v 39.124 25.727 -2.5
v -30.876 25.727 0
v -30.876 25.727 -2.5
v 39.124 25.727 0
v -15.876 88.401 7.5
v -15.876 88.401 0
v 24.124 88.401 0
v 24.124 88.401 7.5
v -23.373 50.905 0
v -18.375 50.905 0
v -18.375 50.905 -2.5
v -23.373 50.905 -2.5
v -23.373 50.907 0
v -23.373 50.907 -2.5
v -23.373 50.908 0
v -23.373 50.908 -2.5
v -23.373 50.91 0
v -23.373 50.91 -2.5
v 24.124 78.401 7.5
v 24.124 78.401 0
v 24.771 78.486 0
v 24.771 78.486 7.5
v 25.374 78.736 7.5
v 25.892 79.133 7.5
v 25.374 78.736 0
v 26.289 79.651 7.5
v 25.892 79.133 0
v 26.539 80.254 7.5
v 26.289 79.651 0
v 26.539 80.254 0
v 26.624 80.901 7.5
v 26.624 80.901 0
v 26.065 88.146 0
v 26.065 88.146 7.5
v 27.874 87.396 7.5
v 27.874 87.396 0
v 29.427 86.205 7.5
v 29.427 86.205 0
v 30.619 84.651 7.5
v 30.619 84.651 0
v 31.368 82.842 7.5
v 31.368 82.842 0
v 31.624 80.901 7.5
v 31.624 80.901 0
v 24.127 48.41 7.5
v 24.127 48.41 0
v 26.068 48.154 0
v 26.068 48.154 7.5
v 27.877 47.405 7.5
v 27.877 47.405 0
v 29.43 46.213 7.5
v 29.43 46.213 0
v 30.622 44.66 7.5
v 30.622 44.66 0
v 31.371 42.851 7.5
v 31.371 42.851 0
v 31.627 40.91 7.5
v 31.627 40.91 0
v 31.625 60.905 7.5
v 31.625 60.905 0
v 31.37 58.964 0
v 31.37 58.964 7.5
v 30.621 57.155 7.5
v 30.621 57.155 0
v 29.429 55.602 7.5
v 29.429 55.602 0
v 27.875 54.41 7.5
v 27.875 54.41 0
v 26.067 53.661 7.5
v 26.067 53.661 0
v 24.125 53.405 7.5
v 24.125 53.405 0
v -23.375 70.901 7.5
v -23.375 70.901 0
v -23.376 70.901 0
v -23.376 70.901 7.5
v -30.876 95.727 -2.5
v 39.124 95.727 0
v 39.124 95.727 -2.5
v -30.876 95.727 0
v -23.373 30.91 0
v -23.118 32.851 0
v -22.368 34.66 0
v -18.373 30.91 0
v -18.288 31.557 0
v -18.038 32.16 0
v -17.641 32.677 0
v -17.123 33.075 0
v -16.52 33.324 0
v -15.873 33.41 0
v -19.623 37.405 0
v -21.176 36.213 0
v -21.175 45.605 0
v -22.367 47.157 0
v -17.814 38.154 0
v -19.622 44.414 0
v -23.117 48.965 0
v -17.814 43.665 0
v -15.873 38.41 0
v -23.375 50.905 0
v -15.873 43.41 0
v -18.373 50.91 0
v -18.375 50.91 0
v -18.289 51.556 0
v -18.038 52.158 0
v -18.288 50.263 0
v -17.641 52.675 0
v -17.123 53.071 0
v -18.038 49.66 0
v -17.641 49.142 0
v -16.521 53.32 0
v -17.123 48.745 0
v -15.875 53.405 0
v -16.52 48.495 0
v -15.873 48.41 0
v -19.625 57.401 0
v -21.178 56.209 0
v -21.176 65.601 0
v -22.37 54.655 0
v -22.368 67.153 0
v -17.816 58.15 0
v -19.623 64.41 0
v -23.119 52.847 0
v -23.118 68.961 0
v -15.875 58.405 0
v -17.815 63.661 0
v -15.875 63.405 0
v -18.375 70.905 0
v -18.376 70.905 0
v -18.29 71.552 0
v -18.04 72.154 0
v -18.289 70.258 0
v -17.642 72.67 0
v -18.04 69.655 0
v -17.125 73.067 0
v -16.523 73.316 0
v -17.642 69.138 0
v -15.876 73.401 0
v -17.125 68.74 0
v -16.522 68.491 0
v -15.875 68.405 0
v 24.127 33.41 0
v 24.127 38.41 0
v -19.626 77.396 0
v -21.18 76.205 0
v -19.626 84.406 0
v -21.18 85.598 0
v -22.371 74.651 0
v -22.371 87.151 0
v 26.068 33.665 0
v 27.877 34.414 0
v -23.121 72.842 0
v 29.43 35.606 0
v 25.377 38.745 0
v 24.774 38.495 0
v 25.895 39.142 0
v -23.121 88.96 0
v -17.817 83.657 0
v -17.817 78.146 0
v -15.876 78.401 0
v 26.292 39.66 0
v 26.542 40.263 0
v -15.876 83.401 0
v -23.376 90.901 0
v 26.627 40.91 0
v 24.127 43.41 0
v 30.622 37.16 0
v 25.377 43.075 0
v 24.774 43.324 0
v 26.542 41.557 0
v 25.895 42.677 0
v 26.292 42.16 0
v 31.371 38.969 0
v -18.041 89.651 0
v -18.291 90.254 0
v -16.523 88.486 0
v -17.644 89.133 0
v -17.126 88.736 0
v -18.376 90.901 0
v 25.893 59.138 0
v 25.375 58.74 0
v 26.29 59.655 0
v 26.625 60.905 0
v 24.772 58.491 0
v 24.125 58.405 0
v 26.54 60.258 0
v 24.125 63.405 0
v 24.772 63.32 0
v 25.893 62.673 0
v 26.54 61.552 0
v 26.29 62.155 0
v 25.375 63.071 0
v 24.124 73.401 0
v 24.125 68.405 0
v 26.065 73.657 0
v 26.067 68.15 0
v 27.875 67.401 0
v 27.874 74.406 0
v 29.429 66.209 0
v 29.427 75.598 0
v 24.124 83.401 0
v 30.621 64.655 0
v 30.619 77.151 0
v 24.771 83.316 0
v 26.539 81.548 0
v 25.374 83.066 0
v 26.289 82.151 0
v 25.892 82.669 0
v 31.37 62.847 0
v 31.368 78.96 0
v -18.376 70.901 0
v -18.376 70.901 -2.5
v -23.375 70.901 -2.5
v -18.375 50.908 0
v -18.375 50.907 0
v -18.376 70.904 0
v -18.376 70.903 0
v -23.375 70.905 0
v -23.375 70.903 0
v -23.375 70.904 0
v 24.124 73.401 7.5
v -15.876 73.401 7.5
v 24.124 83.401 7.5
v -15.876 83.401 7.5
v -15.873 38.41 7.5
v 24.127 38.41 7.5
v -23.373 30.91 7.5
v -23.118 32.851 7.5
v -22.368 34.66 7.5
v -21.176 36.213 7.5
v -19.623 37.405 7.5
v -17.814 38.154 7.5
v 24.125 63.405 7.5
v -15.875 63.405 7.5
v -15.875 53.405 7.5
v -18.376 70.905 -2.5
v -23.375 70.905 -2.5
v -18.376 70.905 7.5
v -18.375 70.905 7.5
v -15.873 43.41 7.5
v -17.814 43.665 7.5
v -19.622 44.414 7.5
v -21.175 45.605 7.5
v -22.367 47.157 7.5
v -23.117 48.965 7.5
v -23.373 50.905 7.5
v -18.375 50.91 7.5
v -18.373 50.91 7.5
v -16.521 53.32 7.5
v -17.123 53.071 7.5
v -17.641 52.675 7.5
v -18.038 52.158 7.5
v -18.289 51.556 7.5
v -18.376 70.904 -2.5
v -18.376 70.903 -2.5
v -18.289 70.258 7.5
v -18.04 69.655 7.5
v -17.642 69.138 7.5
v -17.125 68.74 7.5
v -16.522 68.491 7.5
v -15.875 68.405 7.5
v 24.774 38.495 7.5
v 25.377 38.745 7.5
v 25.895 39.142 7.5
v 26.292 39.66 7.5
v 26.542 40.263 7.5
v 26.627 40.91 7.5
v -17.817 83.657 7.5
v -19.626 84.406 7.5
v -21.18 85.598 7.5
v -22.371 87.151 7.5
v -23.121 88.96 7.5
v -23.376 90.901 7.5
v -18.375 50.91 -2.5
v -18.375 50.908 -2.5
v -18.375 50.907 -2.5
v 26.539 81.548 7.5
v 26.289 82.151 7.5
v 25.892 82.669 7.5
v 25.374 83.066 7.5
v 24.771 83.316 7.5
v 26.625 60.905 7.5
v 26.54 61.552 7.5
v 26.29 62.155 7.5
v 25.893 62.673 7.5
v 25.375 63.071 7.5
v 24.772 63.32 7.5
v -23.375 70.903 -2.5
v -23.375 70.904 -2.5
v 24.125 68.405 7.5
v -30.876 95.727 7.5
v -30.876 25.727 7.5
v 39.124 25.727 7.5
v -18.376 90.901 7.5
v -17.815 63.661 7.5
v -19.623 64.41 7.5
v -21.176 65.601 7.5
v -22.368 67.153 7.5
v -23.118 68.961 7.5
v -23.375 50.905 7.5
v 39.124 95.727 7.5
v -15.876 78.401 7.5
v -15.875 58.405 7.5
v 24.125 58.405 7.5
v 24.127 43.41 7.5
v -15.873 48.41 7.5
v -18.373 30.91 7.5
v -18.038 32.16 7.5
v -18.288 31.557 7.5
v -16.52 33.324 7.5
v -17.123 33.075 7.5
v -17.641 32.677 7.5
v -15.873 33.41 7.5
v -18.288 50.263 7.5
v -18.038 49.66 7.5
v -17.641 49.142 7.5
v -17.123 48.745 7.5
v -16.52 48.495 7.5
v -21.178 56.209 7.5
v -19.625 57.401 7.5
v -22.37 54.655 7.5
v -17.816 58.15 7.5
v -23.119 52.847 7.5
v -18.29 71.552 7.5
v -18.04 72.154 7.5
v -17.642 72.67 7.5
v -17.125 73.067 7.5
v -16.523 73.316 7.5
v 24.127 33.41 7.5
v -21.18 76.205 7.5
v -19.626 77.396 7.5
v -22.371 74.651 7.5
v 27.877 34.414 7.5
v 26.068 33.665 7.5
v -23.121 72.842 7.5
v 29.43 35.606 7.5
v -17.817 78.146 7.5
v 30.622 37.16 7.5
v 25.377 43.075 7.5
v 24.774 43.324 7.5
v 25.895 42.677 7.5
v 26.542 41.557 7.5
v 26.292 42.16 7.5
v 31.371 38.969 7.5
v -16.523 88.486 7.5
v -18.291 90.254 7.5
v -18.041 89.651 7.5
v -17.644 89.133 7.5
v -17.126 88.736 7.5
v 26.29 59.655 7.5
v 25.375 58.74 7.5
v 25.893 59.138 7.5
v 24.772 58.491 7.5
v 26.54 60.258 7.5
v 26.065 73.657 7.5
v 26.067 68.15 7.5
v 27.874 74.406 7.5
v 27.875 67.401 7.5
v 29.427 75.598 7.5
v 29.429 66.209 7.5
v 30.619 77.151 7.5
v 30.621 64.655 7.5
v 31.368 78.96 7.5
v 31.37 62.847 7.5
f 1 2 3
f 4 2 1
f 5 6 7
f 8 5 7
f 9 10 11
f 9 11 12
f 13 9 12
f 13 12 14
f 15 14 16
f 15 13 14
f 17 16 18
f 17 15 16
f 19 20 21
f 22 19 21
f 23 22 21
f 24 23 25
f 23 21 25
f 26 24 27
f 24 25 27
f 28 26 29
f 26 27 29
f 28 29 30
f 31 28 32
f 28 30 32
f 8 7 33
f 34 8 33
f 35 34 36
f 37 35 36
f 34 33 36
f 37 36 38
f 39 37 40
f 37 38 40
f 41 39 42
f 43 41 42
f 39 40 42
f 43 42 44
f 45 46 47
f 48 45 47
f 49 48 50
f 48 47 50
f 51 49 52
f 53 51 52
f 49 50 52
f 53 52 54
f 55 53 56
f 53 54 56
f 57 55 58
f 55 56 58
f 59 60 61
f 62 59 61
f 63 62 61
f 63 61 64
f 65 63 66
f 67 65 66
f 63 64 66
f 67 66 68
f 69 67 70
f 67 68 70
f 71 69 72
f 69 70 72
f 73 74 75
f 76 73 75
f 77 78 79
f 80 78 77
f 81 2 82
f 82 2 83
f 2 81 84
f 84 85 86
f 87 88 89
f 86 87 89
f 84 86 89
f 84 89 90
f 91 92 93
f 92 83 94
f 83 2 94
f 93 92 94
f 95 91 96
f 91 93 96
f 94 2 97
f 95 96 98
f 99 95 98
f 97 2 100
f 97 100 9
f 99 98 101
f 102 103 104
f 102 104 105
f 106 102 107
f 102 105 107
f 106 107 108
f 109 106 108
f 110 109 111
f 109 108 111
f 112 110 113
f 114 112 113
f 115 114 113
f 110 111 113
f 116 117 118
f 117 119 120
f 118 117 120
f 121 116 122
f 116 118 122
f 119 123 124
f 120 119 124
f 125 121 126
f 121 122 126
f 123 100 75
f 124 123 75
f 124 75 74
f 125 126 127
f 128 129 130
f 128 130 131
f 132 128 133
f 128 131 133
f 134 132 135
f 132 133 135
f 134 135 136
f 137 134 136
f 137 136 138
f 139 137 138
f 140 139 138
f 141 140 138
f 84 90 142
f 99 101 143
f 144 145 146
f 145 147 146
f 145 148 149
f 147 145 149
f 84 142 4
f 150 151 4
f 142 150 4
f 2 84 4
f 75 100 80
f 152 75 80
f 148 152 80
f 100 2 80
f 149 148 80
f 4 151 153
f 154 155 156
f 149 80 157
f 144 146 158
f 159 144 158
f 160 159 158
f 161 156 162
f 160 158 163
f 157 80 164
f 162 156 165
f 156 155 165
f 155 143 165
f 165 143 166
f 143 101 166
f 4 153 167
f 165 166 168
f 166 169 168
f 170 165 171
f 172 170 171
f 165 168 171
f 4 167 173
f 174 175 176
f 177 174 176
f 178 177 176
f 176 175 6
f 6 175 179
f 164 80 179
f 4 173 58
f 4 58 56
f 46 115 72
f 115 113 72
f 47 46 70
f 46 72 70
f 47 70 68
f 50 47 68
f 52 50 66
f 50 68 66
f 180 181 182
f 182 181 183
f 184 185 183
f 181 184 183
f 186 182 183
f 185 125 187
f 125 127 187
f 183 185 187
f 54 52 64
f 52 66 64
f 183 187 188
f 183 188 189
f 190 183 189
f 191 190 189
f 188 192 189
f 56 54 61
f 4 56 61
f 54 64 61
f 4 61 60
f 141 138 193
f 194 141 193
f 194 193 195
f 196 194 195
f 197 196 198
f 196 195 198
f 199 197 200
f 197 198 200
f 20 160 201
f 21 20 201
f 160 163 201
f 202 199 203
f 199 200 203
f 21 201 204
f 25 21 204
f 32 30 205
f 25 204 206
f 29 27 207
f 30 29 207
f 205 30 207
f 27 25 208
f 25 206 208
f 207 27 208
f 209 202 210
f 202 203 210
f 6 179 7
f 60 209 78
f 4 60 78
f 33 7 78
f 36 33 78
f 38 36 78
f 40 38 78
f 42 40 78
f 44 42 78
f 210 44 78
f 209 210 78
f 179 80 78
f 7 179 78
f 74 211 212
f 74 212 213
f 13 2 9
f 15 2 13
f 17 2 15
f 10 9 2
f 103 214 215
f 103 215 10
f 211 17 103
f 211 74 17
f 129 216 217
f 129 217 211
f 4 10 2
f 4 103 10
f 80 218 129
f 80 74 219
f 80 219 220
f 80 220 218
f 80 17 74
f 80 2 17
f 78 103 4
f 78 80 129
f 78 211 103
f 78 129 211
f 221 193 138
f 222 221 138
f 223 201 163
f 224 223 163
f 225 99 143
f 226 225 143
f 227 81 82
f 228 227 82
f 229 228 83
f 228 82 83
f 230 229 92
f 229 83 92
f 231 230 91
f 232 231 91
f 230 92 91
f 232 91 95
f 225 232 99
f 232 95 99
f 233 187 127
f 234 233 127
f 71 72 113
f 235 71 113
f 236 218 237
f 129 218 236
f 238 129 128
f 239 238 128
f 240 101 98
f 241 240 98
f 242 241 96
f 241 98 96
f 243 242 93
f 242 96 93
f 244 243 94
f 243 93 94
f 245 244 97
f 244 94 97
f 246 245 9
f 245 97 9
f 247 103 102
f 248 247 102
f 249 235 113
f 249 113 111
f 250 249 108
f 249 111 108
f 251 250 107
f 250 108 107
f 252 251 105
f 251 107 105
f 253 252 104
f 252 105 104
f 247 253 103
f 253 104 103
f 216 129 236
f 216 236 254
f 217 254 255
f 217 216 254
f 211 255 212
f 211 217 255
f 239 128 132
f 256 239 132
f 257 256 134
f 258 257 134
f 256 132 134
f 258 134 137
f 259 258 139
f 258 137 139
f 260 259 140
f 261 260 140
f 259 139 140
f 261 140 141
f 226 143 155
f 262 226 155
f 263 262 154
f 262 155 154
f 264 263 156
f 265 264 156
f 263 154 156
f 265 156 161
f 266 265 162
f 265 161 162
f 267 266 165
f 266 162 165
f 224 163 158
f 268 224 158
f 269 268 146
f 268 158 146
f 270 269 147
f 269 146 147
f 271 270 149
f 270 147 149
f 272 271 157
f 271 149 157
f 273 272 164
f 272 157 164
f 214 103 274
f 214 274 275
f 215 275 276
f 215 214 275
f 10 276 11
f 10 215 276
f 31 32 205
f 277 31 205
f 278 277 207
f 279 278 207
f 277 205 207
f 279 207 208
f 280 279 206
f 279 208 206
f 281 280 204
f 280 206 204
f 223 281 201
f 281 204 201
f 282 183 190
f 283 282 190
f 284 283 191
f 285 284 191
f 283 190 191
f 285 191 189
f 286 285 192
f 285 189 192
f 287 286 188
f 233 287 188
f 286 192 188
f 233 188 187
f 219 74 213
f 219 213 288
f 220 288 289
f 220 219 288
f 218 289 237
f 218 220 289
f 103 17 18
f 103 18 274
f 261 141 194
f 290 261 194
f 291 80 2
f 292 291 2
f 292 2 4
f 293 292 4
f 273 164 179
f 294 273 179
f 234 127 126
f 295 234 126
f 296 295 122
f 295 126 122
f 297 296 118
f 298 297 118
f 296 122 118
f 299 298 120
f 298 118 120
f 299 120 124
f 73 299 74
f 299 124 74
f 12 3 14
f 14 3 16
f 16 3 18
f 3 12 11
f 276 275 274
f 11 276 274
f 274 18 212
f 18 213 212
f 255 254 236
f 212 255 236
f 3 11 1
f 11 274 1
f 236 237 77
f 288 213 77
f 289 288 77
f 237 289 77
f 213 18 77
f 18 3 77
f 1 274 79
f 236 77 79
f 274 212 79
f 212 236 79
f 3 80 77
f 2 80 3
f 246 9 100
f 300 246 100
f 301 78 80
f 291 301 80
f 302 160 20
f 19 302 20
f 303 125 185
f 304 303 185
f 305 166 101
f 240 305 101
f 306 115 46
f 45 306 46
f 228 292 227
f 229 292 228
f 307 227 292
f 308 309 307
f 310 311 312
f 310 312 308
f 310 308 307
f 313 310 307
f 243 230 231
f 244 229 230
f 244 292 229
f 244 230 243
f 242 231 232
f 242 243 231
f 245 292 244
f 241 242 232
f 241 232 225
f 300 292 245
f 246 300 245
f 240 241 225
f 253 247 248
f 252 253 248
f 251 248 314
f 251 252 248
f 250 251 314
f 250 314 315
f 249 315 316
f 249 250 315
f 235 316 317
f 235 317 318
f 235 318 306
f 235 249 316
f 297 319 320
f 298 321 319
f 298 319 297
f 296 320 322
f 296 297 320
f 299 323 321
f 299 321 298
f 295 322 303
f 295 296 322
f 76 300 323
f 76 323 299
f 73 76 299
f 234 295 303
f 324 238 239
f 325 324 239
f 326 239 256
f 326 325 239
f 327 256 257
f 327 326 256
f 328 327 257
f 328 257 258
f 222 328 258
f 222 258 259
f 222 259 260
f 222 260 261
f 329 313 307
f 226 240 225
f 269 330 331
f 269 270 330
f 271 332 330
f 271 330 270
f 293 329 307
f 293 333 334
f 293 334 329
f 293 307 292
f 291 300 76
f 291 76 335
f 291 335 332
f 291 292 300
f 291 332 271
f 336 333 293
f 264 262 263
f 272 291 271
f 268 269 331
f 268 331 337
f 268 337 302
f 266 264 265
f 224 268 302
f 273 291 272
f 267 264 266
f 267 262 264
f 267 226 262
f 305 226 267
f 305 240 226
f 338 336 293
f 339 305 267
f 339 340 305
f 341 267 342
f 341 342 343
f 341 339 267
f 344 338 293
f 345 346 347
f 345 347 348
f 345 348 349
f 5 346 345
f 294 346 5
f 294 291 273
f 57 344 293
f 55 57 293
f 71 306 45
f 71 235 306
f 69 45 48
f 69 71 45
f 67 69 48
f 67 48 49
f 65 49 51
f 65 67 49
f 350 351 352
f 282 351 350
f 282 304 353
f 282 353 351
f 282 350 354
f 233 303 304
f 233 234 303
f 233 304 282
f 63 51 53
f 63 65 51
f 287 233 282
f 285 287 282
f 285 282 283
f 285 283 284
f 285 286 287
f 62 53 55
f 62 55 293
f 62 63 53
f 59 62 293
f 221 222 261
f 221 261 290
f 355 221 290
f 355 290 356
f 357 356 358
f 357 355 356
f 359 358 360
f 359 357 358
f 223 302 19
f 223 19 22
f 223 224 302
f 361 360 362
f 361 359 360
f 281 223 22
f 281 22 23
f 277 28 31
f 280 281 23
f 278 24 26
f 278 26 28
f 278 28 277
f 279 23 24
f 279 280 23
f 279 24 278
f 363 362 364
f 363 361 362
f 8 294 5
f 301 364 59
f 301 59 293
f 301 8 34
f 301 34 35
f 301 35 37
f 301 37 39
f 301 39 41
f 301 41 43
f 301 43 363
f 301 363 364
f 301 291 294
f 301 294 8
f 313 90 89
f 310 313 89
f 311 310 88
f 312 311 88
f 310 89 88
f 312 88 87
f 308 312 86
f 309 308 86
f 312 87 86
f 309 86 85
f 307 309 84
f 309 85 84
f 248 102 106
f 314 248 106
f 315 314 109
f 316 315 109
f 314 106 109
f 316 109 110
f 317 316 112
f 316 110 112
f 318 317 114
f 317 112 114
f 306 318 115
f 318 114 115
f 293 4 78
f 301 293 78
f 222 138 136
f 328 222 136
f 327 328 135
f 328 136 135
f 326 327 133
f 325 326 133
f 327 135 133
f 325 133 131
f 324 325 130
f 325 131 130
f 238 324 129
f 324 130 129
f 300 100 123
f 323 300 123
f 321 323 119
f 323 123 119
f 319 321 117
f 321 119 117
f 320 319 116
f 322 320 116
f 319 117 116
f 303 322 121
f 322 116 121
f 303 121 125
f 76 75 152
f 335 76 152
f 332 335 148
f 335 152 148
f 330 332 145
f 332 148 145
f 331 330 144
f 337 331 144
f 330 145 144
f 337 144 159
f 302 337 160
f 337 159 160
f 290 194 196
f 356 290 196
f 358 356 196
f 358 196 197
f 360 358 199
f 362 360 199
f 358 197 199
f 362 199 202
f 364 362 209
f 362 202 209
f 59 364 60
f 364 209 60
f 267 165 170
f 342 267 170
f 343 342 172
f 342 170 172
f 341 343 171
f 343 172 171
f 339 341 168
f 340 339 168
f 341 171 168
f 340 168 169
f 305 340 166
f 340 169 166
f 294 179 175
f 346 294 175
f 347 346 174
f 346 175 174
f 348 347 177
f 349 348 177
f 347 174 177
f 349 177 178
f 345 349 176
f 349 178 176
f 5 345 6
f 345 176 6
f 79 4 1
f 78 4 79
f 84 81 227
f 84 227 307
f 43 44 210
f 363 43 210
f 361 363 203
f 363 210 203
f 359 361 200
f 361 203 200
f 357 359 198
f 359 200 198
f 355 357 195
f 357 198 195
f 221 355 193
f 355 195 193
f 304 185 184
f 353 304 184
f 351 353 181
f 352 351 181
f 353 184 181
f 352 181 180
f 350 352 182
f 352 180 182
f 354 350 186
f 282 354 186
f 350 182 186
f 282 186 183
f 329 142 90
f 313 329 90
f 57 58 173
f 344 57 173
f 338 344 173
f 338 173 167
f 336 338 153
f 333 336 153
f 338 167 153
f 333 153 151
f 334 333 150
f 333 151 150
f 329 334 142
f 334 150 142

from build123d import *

# Parameters (mm, degrees)
F0_W     = 5
F0_H     = 4.826
F0_H_2   = 5.182414
F1_DEPTH = 7.5
F2_DEPTH = 2.5


with BuildPart() as f1:
    # F0 (on Top) → F1 (new body)
    with BuildSketch(Plane.XY):
        with BuildLine():
            ThreePointArc((-15.873059, 43.409657), (-21.174872, 45.604869), (-23.373057, 50.90545))
            Line((-23.373057, 50.90545), (-23.37463, 50.90545))
            ThreePointArc((-23.37463, 50.90545), (-21.177931, 56.208751), (-15.87463, 58.40545))
            Line((-15.87463, 58.40545), (24.12537, 58.40545))
            ThreePointArc((24.12537, 58.40545), (25.893137, 59.137683), (26.62537, 60.90545))
            ThreePointArc((26.62537, 60.90545), (25.893137, 62.673217), (24.12537, 63.40545))
            Line((24.12537, 63.40545), (-15.87463, 63.40545))
            ThreePointArc((-15.87463, 63.40545), (-21.176443, 65.600662), (-23.374629, 70.901243))
            Line((-23.374629, 70.901243), (-23.376201, 70.901243))
            ThreePointArc((-23.376201, 70.901243), (-21.179502, 76.204544), (-15.876201, 78.401243))
            Line((-15.876201, 78.401243), (24.123799, 78.401243))
            ThreePointArc((24.123799, 78.401243), (25.891565, 79.133476), (26.623799, 80.901243))
            ThreePointArc((26.623799, 80.901243), (25.891565, 82.66901), (24.123799, 83.401243))
            Line((24.123799, 83.401243), (-15.876201, 83.401243))
            ThreePointArc((-15.876201, 83.401243), (-21.179502, 85.597942), (-23.376201, 90.901243))
            Line((-23.376201, 90.901243), (-23.376201, 95.727243))
            Line((-23.376201, 95.727243), (-30.876201, 95.727243))
            Line((-30.876201, 95.727243), (-30.876201, 25.727243))
            Line((-30.876201, 25.727243), (-23.373059, 25.727243))
            Line((-23.373059, 25.727243), (-23.373059, 30.909657))
            ThreePointArc((-23.373059, 30.909657), (-21.176359, 36.212958), (-15.873059, 38.409657))
            Line((-15.873059, 38.409657), (24.126941, 38.409657))
            ThreePointArc((24.126941, 38.409657), (25.894708, 39.14189), (26.626941, 40.909657))
            ThreePointArc((26.626941, 40.909657), (25.894708, 42.677424), (24.126941, 43.409657))
            Line((24.126941, 43.409657), (-15.873059, 43.409657))
        make_face()
        with BuildLine():
            ThreePointArc((-15.87463, 53.40545), (-17.640909, 52.674704), (-18.374626, 50.909657))
            Line((-18.374626, 50.909657), (-18.373059, 50.909657))
            ThreePointArc((-18.373059, 50.909657), (-17.640825, 49.14189), (-15.873059, 48.409657))
            Line((-15.873059, 48.409657), (24.126941, 48.409657))
            ThreePointArc((24.126941, 48.409657), (29.430242, 46.212958), (31.626941, 40.909657))
            ThreePointArc((31.626941, 40.909657), (29.430242, 35.606356), (24.126941, 33.409657))
            Line((24.126941, 33.409657), (-15.873059, 33.409657))
            ThreePointArc((-15.873059, 33.409657), (-17.640825, 32.677424), (-18.373059, 30.909657))
            Line((-18.373059, 30.909657), (-18.373059, 25.727243))
            Line((-18.373059, 25.727243), (39.123799, 25.727243))
            Line((39.123799, 25.727243), (39.123799, 95.727243))
            Line((39.123799, 95.727243), (-18.376201, 95.727243))
            Line((-18.376201, 95.727243), (-18.376201, 90.901243))
            ThreePointArc((-18.376201, 90.901243), (-17.643968, 89.133476), (-15.876201, 88.401243))
            Line((-15.876201, 88.401243), (24.123799, 88.401243))
            ThreePointArc((24.123799, 88.401243), (29.427099, 86.204544), (31.623799, 80.901243))
            ThreePointArc((31.623799, 80.901243), (29.427099, 75.597942), (24.123799, 73.401243))
            Line((24.123799, 73.401243), (-15.876201, 73.401243))
            ThreePointArc((-15.876201, 73.401243), (-17.64248, 72.670497), (-18.376198, 70.90545))
            Line((-18.376198, 70.90545), (-18.37463, 70.90545))
            ThreePointArc((-18.37463, 70.90545), (-17.642397, 69.137683), (-15.87463, 68.40545))
            Line((-15.87463, 68.40545), (24.12537, 68.40545))
            ThreePointArc((24.12537, 68.40545), (29.428671, 66.208751), (31.62537, 60.90545))
            ThreePointArc((31.62537, 60.90545), (29.428671, 55.602149), (24.12537, 53.40545))
            Line((24.12537, 53.40545), (-15.87463, 53.40545))
        make_face()
        with Locations((-20.876201, 93.314243)):
            Rectangle(F0_W, F0_H)
        with Locations((-20.873059, 28.31845)):
            Rectangle(F0_W, F0_H_2)
    extrude(amount=F1_DEPTH)


with BuildPart() as f2:
    # F0 (on Top) → F2 (new body)
    with BuildSketch(Plane.XY):
        with BuildLine():
            ThreePointArc((-23.373057, 50.90545), (-23.373058, 50.907553), (-23.373059, 50.909657))
            Line((-23.373059, 50.909657), (-18.374626, 50.909657))
            ThreePointArc((-18.374626, 50.909657), (-17.640909, 52.674704), (-15.87463, 53.40545))
            Line((-15.87463, 53.40545), (24.12537, 53.40545))
            ThreePointArc((24.12537, 53.40545), (29.428671, 55.602149), (31.62537, 60.90545))
            ThreePointArc((31.62537, 60.90545), (29.428671, 66.208751), (24.12537, 68.40545))
            Line((24.12537, 68.40545), (-15.87463, 68.40545))
            ThreePointArc((-15.87463, 68.40545), (-17.642397, 69.137683), (-18.37463, 70.90545))
            Line((-18.37463, 70.90545), (-18.376198, 70.90545))
            ThreePointArc((-18.376198, 70.90545), (-18.376201, 70.903347), (-18.376201, 70.901243))
            Line((-18.376201, 70.901243), (-23.374629, 70.901243))
            ThreePointArc((-23.374629, 70.901243), (-21.176443, 65.600662), (-15.87463, 63.40545))
            Line((-15.87463, 63.40545), (24.12537, 63.40545))
            ThreePointArc((24.12537, 63.40545), (25.893137, 62.673217), (26.62537, 60.90545))
            ThreePointArc((26.62537, 60.90545), (25.893137, 59.137683), (24.12537, 58.40545))
            Line((24.12537, 58.40545), (-15.87463, 58.40545))
            ThreePointArc((-15.87463, 58.40545), (-21.177931, 56.208751), (-23.37463, 50.90545))
            Line((-23.37463, 50.90545), (-23.373057, 50.90545))
        make_face()
        with BuildLine():
            Line((-18.373059, 50.909657), (-18.374626, 50.909657))
            ThreePointArc((-18.374626, 50.909657), (-18.374629, 50.907553), (-18.37463, 50.90545))
            Line((-18.37463, 50.90545), (-23.373057, 50.90545))
            ThreePointArc((-23.373057, 50.90545), (-21.174872, 45.604869), (-15.873059, 43.409657))
            Line((-15.873059, 43.409657), (24.126941, 43.409657))
            ThreePointArc((24.126941, 43.409657), (25.894708, 42.677424), (26.626941, 40.909657))
            ThreePointArc((26.626941, 40.909657), (25.894708, 39.14189), (24.126941, 38.409657))
            Line((24.126941, 38.409657), (-15.873059, 38.409657))
            ThreePointArc((-15.873059, 38.409657), (-21.176359, 36.212958), (-23.373059, 30.909657))
            Line((-23.373059, 30.909657), (-18.373059, 30.909657))
            ThreePointArc((-18.373059, 30.909657), (-17.640825, 32.677424), (-15.873059, 33.409657))
            Line((-15.873059, 33.409657), (24.126941, 33.409657))
            ThreePointArc((24.126941, 33.409657), (29.430242, 35.606356), (31.626941, 40.909657))
            ThreePointArc((31.626941, 40.909657), (29.430242, 46.212958), (24.126941, 48.409657))
            Line((24.126941, 48.409657), (-15.873059, 48.409657))
            ThreePointArc((-15.873059, 48.409657), (-17.640825, 49.14189), (-18.373059, 50.909657))
        make_face()
        with Locations((-20.876201, 93.314243)):
            Rectangle(F0_W, F0_H)
        with Locations((-20.873059, 28.31845)):
            Rectangle(F0_W, F0_H_2)
        with BuildLine():
            ThreePointArc((-15.873059, 43.409657), (-21.174872, 45.604869), (-23.373057, 50.90545))
            Line((-23.373057, 50.90545), (-23.37463, 50.90545))
            ThreePointArc((-23.37463, 50.90545), (-21.177931, 56.208751), (-15.87463, 58.40545))
            Line((-15.87463, 58.40545), (24.12537, 58.40545))
            ThreePointArc((24.12537, 58.40545), (25.893137, 59.137683), (26.62537, 60.90545))
            ThreePointArc((26.62537, 60.90545), (25.893137, 62.673217), (24.12537, 63.40545))
            Line((24.12537, 63.40545), (-15.87463, 63.40545))
            ThreePointArc((-15.87463, 63.40545), (-21.176443, 65.600662), (-23.374629, 70.901243))
            Line((-23.374629, 70.901243), (-23.376201, 70.901243))
            ThreePointArc((-23.376201, 70.901243), (-21.179502, 76.204544), (-15.876201, 78.401243))
            Line((-15.876201, 78.401243), (24.123799, 78.401243))
            ThreePointArc((24.123799, 78.401243), (25.891565, 79.133476), (26.623799, 80.901243))
            ThreePointArc((26.623799, 80.901243), (25.891565, 82.66901), (24.123799, 83.401243))
            Line((24.123799, 83.401243), (-15.876201, 83.401243))
            ThreePointArc((-15.876201, 83.401243), (-21.179502, 85.597942), (-23.376201, 90.901243))
            Line((-23.376201, 90.901243), (-23.376201, 95.727243))
            Line((-23.376201, 95.727243), (-30.876201, 95.727243))
            Line((-30.876201, 95.727243), (-30.876201, 25.727243))
            Line((-30.876201, 25.727243), (-23.373059, 25.727243))
            Line((-23.373059, 25.727243), (-23.373059, 30.909657))
            ThreePointArc((-23.373059, 30.909657), (-21.176359, 36.212958), (-15.873059, 38.409657))
            Line((-15.873059, 38.409657), (24.126941, 38.409657))
            ThreePointArc((24.126941, 38.409657), (25.894708, 39.14189), (26.626941, 40.909657))
            ThreePointArc((26.626941, 40.909657), (25.894708, 42.677424), (24.126941, 43.409657))
            Line((24.126941, 43.409657), (-15.873059, 43.409657))
        make_face()
        with BuildLine():
            Line((-23.37463, 70.90545), (-18.376198, 70.90545))
            ThreePointArc((-18.376198, 70.90545), (-17.64248, 72.670497), (-15.876201, 73.401243))
            Line((-15.876201, 73.401243), (24.123799, 73.401243))
            ThreePointArc((24.123799, 73.401243), (29.427099, 75.597942), (31.623799, 80.901243))
            ThreePointArc((31.623799, 80.901243), (29.427099, 86.204544), (24.123799, 88.401243))
            Line((24.123799, 88.401243), (-15.876201, 88.401243))
            ThreePointArc((-15.876201, 88.401243), (-17.643968, 89.133476), (-18.376201, 90.901243))
            Line((-18.376201, 90.901243), (-23.376201, 90.901243))
            ThreePointArc((-23.376201, 90.901243), (-21.179502, 85.597942), (-15.876201, 83.401243))
            Line((-15.876201, 83.401243), (24.123799, 83.401243))
            ThreePointArc((24.123799, 83.401243), (25.891565, 82.66901), (26.623799, 80.901243))
            ThreePointArc((26.623799, 80.901243), (25.891565, 79.133476), (24.123799, 78.401243))
            Line((24.123799, 78.401243), (-15.876201, 78.401243))
            ThreePointArc((-15.876201, 78.401243), (-21.179502, 76.204544), (-23.376201, 70.901243))
            Line((-23.376201, 70.901243), (-23.374629, 70.901243))
            ThreePointArc((-23.374629, 70.901243), (-23.37463, 70.903347), (-23.37463, 70.90545))
        make_face()
        with BuildLine():
            ThreePointArc((-15.87463, 53.40545), (-17.640909, 52.674704), (-18.374626, 50.909657))
            Line((-18.374626, 50.909657), (-18.373059, 50.909657))
            ThreePointArc((-18.373059, 50.909657), (-17.640825, 49.14189), (-15.873059, 48.409657))
            Line((-15.873059, 48.409657), (24.126941, 48.409657))
            ThreePointArc((24.126941, 48.409657), (29.430242, 46.212958), (31.626941, 40.909657))
            ThreePointArc((31.626941, 40.909657), (29.430242, 35.606356), (24.126941, 33.409657))
            Line((24.126941, 33.409657), (-15.873059, 33.409657))
            ThreePointArc((-15.873059, 33.409657), (-17.640825, 32.677424), (-18.373059, 30.909657))
            Line((-18.373059, 30.909657), (-18.373059, 25.727243))
            Line((-18.373059, 25.727243), (39.123799, 25.727243))
            Line((39.123799, 25.727243), (39.123799, 95.727243))
            Line((39.123799, 95.727243), (-18.376201, 95.727243))
            Line((-18.376201, 95.727243), (-18.376201, 90.901243))
            ThreePointArc((-18.376201, 90.901243), (-17.643968, 89.133476), (-15.876201, 88.401243))
            Line((-15.876201, 88.401243), (24.123799, 88.401243))
            ThreePointArc((24.123799, 88.401243), (29.427099, 86.204544), (31.623799, 80.901243))
            ThreePointArc((31.623799, 80.901243), (29.427099, 75.597942), (24.123799, 73.401243))
            Line((24.123799, 73.401243), (-15.876201, 73.401243))
            ThreePointArc((-15.876201, 73.401243), (-17.64248, 72.670497), (-18.376198, 70.90545))
            Line((-18.376198, 70.90545), (-18.37463, 70.90545))
            ThreePointArc((-18.37463, 70.90545), (-17.642397, 69.137683), (-15.87463, 68.40545))
            Line((-15.87463, 68.40545), (24.12537, 68.40545))
            ThreePointArc((24.12537, 68.40545), (29.428671, 66.208751), (31.62537, 60.90545))
            ThreePointArc((31.62537, 60.90545), (29.428671, 55.602149), (24.12537, 53.40545))
            Line((24.12537, 53.40545), (-15.87463, 53.40545))
        make_face()
    extrude(amount=-F2_DEPTH)


solid = Compound([f1.part, f2.part])
